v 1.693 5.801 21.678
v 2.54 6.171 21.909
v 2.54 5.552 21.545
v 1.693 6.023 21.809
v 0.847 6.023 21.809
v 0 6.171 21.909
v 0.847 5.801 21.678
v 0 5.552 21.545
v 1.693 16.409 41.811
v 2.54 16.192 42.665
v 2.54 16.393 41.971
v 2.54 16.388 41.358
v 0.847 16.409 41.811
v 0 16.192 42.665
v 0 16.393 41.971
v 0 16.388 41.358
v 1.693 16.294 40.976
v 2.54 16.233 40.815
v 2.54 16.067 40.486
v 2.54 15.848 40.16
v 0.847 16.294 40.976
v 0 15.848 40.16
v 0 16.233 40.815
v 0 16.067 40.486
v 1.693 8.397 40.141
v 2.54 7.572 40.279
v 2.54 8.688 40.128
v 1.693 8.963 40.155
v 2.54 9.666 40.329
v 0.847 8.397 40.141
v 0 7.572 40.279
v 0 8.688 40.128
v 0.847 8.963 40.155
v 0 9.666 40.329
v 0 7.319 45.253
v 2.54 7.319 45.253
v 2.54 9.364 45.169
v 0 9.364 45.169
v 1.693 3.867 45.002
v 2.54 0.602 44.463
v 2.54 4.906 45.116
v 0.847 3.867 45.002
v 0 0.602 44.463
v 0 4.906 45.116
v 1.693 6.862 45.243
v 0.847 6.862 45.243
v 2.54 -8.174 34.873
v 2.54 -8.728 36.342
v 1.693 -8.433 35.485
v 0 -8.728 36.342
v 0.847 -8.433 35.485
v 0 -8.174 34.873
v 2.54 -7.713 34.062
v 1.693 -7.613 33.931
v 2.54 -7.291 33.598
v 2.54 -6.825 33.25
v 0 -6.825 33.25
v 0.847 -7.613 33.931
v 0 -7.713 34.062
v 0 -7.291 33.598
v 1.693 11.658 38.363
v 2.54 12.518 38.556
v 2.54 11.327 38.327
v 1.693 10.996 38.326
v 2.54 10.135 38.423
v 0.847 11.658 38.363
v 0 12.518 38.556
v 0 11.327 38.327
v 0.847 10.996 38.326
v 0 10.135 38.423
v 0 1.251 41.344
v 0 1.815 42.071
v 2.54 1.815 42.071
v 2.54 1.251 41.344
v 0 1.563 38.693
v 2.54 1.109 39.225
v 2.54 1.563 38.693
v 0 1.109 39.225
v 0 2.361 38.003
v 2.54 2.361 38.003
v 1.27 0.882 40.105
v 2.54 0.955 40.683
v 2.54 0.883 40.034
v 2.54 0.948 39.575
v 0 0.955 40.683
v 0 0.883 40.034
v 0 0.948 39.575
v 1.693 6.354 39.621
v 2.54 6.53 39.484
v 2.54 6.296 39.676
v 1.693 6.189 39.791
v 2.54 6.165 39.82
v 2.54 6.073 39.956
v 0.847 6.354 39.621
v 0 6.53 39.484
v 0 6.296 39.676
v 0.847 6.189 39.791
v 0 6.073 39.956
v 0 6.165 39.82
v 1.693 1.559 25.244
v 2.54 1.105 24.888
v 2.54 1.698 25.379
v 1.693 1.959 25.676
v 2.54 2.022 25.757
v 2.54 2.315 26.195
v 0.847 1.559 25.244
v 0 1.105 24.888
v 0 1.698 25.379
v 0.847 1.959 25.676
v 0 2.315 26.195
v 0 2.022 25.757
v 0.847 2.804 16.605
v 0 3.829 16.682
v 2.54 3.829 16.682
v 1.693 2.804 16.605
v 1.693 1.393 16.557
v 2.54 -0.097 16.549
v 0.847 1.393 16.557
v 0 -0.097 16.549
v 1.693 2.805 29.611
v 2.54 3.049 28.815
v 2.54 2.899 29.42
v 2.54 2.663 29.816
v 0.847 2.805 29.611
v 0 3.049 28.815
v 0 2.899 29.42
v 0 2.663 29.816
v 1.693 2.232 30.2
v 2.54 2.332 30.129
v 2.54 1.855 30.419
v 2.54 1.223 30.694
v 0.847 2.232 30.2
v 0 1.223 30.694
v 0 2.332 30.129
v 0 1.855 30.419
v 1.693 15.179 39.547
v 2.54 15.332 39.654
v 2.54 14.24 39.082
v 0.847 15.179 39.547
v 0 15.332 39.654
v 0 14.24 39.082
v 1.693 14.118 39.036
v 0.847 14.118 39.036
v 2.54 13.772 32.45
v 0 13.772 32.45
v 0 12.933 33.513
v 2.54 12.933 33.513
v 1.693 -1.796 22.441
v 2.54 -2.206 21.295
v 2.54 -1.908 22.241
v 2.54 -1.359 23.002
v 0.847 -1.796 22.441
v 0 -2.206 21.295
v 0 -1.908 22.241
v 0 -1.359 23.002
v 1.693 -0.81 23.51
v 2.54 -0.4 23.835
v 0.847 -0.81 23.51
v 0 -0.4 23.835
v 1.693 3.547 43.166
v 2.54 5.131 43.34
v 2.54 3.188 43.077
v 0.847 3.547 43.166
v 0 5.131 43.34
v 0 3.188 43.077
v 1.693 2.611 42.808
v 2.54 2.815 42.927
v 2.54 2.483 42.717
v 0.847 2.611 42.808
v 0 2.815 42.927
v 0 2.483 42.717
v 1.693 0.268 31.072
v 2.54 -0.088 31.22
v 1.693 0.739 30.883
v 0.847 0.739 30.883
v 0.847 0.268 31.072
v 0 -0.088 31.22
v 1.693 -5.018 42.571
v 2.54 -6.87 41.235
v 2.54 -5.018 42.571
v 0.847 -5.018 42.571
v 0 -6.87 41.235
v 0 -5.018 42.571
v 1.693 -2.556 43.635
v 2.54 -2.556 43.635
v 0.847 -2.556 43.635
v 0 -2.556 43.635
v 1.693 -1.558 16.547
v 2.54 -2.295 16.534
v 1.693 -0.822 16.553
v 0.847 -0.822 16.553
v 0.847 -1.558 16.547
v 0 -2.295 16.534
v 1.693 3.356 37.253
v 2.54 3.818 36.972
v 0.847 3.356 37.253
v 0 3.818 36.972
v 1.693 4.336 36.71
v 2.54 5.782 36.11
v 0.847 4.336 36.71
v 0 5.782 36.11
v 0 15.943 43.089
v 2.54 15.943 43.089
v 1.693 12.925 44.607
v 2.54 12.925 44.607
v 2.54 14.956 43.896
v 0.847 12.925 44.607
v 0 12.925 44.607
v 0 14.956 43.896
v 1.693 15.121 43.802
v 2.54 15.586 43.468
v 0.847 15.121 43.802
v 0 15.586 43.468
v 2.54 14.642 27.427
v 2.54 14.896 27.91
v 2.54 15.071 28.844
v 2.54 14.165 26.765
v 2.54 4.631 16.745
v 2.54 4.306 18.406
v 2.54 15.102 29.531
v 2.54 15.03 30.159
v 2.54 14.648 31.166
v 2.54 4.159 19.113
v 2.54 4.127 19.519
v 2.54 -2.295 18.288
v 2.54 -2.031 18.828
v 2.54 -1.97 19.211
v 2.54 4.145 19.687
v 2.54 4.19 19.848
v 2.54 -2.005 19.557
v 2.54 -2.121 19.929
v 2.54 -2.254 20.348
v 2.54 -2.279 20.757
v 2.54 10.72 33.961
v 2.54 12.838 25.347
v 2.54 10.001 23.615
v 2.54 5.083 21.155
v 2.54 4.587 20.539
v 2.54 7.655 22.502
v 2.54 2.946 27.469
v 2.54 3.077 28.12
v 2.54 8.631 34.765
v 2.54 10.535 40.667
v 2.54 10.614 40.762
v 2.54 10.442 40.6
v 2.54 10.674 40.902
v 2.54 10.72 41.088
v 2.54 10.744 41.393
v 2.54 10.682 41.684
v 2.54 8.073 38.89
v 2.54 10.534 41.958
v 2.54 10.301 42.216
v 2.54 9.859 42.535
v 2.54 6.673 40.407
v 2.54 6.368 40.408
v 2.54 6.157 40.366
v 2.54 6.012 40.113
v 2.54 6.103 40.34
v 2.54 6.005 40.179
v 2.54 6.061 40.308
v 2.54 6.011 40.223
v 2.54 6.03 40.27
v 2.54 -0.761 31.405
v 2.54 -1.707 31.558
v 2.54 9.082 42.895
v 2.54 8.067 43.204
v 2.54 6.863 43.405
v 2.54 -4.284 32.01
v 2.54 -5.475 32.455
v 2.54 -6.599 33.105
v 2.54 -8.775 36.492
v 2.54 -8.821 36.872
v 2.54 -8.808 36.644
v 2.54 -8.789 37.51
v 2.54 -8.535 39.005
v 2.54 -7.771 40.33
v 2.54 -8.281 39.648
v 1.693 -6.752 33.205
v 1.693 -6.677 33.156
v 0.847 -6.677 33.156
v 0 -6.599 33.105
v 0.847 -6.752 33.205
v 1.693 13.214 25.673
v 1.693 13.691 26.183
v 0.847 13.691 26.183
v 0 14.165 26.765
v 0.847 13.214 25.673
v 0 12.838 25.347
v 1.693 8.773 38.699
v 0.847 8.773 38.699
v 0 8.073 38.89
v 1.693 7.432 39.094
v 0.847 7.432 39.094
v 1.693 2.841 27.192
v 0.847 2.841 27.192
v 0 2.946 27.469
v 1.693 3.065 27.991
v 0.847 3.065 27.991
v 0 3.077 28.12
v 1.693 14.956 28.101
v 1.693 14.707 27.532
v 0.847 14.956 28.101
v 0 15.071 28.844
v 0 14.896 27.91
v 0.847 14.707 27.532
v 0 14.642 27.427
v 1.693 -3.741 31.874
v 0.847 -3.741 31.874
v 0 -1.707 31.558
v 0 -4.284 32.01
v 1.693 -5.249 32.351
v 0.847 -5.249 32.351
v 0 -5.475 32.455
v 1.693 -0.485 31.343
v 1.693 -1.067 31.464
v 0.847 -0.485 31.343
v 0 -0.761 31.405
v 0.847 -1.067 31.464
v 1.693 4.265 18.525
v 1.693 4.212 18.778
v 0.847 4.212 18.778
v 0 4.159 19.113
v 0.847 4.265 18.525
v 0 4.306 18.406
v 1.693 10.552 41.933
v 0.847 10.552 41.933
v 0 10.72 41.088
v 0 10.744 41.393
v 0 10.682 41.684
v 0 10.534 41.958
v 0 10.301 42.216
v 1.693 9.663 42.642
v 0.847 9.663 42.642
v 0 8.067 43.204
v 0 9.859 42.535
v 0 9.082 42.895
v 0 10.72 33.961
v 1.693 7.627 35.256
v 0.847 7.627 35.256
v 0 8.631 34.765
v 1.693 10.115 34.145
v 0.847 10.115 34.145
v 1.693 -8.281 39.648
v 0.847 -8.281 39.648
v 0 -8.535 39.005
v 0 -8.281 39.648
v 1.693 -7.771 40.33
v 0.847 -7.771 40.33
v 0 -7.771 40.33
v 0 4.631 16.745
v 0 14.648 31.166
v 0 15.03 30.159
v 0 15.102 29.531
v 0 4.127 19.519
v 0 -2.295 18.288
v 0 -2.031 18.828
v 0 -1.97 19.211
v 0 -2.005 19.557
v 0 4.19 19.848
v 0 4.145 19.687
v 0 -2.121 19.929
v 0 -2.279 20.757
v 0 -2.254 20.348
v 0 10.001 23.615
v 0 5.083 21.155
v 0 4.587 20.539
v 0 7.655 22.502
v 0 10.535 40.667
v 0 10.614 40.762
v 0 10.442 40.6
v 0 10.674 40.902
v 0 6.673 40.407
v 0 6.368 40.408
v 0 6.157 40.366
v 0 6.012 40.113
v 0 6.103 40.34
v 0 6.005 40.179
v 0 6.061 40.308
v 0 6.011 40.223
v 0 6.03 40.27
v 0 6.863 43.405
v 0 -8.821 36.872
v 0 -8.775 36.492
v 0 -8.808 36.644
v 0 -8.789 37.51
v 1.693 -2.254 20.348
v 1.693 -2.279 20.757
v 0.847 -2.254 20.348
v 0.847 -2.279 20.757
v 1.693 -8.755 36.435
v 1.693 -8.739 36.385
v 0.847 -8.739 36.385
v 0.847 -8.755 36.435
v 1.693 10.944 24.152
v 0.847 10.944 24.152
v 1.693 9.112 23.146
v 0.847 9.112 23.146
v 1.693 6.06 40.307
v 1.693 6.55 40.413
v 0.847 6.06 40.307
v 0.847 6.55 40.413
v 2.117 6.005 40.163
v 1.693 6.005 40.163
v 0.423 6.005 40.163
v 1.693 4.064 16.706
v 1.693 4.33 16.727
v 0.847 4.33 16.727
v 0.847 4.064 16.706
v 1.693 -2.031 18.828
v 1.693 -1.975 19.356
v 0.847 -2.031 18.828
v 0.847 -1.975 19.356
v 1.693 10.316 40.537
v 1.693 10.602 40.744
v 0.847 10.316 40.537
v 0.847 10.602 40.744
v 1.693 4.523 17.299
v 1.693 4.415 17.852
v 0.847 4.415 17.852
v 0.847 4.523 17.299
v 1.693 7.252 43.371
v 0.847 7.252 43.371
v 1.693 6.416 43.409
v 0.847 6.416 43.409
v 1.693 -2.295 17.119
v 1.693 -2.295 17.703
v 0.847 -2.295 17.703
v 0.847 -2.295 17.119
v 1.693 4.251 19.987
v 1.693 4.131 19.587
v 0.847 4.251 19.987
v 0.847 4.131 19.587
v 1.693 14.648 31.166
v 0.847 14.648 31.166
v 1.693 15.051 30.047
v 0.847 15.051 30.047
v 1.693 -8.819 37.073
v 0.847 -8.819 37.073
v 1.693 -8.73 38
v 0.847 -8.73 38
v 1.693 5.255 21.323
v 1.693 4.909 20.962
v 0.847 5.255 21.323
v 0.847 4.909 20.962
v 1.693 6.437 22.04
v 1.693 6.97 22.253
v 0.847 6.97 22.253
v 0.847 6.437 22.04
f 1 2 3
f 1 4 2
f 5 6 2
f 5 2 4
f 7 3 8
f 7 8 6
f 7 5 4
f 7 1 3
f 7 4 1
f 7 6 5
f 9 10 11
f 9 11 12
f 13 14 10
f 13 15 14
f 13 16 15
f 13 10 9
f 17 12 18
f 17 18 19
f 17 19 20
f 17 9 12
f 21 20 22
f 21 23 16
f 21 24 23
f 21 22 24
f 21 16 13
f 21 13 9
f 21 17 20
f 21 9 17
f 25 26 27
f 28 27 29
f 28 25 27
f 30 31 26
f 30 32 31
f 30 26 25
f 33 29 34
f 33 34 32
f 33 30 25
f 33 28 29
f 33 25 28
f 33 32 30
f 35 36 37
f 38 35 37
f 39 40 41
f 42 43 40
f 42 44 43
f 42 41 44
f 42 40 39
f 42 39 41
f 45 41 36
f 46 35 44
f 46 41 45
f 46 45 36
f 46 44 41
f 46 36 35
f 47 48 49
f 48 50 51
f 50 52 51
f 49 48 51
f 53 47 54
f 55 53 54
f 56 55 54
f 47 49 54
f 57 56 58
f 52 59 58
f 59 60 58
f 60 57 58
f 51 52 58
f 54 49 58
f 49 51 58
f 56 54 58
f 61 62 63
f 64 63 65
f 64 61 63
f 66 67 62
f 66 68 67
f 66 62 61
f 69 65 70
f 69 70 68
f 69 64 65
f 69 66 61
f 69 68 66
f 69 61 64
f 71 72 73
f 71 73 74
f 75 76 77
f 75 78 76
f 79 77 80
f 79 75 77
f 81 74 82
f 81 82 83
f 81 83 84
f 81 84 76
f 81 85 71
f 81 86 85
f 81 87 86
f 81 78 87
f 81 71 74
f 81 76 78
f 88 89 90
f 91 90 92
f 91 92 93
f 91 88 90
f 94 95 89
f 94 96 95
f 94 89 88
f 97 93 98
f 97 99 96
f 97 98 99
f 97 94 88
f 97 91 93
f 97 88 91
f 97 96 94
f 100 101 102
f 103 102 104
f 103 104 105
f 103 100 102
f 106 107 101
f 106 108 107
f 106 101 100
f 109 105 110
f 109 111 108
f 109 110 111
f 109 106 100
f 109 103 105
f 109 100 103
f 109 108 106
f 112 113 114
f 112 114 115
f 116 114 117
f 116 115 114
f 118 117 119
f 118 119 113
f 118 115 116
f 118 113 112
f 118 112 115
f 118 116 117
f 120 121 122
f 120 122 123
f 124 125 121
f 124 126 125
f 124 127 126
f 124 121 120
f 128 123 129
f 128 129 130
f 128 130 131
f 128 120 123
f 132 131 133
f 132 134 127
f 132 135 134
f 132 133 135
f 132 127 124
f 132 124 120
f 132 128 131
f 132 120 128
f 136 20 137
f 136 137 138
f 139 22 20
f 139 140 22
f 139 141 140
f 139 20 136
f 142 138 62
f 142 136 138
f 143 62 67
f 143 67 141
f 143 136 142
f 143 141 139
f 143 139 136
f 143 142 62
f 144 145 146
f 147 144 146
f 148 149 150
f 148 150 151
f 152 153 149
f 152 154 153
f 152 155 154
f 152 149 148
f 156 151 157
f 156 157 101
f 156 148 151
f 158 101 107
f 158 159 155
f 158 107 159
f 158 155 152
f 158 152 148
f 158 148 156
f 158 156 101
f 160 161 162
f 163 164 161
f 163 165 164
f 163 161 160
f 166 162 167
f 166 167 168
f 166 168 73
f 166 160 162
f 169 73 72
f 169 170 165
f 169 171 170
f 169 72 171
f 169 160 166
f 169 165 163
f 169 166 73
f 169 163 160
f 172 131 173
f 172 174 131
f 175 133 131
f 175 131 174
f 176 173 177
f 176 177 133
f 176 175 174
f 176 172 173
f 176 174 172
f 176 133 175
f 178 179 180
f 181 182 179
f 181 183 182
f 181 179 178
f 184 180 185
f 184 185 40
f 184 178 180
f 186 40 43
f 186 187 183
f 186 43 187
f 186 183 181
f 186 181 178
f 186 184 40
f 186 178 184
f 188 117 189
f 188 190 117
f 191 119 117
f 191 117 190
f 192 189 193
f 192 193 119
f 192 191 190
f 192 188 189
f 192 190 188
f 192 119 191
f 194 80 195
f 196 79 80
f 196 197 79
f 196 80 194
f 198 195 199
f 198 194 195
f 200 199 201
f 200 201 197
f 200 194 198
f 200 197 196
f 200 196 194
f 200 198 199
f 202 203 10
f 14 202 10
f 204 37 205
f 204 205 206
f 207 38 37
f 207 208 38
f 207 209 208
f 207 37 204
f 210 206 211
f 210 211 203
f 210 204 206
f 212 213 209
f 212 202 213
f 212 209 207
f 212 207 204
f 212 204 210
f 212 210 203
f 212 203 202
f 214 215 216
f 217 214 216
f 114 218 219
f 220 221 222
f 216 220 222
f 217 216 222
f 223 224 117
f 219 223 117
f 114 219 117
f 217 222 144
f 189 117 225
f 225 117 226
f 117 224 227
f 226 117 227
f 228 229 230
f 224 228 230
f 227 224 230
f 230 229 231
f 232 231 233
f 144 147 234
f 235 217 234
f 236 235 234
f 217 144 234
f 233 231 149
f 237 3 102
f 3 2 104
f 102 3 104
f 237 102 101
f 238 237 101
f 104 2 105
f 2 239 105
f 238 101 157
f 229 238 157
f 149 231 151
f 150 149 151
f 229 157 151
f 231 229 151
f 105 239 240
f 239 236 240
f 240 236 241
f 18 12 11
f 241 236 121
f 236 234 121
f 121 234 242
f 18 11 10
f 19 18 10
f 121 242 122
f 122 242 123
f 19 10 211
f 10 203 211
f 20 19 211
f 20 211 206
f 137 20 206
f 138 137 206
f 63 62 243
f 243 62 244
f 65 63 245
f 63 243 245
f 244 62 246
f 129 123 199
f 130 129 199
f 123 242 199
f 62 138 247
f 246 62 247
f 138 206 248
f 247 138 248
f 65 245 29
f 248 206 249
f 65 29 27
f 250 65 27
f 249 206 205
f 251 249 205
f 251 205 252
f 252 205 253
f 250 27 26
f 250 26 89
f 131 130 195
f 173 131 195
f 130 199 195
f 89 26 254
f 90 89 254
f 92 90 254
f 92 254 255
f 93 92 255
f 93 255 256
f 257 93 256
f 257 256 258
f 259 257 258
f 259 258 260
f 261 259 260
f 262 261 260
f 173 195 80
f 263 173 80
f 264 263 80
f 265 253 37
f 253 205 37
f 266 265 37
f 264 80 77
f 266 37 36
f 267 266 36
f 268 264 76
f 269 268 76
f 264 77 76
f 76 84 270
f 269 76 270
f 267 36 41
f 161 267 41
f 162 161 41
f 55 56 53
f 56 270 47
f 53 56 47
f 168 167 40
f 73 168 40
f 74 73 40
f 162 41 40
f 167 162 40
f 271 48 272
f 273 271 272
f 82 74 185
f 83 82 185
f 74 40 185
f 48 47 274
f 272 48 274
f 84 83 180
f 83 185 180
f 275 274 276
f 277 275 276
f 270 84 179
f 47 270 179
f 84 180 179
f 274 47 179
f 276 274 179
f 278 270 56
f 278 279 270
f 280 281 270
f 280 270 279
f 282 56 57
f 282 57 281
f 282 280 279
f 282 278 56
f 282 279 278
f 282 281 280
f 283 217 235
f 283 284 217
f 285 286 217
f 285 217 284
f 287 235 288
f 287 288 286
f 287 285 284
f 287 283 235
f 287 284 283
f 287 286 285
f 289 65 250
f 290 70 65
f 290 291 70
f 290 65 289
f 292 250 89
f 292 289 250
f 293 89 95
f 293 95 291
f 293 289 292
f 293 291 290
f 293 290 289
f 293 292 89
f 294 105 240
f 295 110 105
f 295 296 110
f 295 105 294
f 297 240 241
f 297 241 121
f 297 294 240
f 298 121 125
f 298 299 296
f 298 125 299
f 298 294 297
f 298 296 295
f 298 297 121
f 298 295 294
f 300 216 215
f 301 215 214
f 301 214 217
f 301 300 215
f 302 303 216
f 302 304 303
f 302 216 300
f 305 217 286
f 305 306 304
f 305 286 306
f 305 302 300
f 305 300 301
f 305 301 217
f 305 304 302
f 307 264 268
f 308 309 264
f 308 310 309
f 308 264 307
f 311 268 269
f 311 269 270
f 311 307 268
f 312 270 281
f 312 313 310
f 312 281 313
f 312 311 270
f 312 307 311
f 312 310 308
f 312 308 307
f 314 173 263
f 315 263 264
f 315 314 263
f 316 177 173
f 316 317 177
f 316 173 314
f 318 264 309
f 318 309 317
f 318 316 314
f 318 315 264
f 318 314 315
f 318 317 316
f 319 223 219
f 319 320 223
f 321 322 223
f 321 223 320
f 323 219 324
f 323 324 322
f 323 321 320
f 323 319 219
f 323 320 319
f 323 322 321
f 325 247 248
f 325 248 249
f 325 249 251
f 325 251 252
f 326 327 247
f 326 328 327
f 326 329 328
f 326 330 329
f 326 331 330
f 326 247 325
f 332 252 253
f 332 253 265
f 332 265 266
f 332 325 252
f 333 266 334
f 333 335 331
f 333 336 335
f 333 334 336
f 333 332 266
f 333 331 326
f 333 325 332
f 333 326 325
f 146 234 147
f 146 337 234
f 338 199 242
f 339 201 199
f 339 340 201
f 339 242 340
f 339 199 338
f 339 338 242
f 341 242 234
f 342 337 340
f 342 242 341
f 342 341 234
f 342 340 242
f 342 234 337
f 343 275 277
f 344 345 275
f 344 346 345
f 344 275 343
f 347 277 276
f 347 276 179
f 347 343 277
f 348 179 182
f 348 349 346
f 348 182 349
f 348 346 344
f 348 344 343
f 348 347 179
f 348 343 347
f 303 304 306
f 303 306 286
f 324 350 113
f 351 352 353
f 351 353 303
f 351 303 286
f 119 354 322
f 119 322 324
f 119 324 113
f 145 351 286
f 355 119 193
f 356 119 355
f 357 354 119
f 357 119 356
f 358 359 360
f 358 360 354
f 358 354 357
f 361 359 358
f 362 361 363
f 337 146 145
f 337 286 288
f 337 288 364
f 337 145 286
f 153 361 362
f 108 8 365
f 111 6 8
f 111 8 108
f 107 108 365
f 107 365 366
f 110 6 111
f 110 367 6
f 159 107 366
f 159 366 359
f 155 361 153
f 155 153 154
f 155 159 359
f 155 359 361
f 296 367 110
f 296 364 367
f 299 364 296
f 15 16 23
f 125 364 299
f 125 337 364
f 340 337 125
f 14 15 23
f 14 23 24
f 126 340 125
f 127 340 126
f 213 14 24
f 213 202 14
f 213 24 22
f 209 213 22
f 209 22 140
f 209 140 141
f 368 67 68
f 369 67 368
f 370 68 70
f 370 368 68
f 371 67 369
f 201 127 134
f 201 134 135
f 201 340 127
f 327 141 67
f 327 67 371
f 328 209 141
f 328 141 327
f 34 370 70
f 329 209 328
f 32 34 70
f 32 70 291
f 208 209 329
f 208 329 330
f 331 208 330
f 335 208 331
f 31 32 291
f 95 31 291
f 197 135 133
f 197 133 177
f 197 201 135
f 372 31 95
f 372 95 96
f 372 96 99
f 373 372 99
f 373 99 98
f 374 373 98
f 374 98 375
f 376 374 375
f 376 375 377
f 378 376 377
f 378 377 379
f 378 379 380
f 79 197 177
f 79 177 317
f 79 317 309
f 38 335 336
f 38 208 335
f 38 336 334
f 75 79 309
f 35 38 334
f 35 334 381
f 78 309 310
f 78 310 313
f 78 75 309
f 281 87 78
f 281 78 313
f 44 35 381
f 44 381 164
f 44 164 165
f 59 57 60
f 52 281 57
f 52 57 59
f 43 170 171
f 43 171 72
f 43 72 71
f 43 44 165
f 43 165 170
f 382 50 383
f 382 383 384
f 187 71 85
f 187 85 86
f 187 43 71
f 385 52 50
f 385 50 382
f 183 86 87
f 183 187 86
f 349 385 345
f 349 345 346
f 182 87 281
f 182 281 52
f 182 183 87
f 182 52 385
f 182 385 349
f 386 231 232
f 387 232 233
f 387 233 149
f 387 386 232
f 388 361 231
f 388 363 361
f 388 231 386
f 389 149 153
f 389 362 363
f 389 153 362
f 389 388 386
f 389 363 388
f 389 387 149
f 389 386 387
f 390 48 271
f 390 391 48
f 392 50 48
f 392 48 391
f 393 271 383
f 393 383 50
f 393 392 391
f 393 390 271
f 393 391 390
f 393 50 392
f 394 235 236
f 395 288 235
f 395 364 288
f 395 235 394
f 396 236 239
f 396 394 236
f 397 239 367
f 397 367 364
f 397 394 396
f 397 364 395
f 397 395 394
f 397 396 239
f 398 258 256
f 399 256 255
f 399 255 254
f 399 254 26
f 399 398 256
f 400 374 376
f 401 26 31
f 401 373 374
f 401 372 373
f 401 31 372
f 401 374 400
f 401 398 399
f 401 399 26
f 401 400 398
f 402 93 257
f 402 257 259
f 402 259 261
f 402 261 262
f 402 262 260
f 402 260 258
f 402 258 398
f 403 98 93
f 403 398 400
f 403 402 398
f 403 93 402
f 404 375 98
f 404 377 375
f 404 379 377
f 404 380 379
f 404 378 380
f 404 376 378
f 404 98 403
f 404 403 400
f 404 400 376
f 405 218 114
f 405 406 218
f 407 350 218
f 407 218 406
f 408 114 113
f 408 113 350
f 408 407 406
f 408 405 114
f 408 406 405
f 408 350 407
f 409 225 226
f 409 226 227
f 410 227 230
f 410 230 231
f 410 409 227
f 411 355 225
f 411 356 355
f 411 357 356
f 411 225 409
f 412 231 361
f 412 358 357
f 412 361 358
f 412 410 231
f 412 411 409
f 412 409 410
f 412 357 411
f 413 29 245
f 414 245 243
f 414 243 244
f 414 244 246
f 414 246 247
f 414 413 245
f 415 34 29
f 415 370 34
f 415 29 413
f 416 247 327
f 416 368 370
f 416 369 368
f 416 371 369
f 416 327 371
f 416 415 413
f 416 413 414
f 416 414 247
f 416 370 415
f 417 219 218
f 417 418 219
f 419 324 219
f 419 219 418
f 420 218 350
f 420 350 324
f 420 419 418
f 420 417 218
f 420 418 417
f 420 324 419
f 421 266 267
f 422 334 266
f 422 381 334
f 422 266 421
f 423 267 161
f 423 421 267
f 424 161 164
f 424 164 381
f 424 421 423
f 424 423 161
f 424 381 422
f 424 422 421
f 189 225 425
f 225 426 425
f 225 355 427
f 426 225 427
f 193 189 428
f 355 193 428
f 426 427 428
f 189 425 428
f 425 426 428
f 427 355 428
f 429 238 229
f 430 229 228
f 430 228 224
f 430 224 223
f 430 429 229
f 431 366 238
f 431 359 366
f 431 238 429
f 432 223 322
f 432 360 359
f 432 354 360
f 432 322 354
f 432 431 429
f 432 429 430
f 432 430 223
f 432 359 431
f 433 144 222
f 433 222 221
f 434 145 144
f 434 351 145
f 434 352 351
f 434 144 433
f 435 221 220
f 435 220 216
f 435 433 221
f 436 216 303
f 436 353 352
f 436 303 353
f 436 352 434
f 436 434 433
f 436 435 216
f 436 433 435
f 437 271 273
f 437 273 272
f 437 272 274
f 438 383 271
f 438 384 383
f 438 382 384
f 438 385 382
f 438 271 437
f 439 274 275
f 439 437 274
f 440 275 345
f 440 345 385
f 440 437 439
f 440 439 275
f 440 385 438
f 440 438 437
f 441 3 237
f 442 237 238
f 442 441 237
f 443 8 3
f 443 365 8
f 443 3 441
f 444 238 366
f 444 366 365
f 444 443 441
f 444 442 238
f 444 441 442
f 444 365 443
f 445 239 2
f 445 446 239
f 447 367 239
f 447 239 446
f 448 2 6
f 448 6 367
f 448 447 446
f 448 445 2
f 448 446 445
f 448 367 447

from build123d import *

# Parameters (mm, degrees)
F1_DEPTH = 2.54


with BuildPart() as f1:
    # F0 (on Right) → F1 (new body)
    with BuildSketch(Plane.YZ):
        with BuildLine():
            add(Edge.make_bspline(
                [(4.3062982129, 18.4064569529), (4.4145754331, 17.851669978), (4.5227315225, 17.2993939442), (4.6310087426, 16.7446069692)],
                knots=[0, 0, 0, 0, 1.6932756114, 1.6932756114, 1.6932756114, 1.6932756114], degree=3))
            add(Edge.make_bspline(
                [(4.1593257549, 19.1126760485), (4.2081809899, 18.7562347142), (4.274320241, 18.4384364203), (4.3062982129, 18.4064569529)],
                knots=[0, 0, 0, 0, 1, 1, 1, 1], degree=3))
            add(Edge.make_bspline(
                [(4.587080479, 20.5390156251), (4.1199305204, 19.8352235894), (4.0789979985, 19.6987369871), (4.1593257549, 19.1126760485)],
                knots=[0, 0, 0, 0, 1, 1, 1, 1], degree=3))
            add(Edge.make_bspline(
                [(5.5515264837, 21.5446767853), (5.3052015891, 21.4196091783), (4.8712005131, 20.9670619552), (4.587080479, 20.5390156251)],
                knots=[0, 0, 0, 0, 1, 1, 1, 1], degree=3))
            add(Edge.make_bspline(
                [(6.1705583504, 21.9085323912), (6.0764144472, 21.8334789664), (5.7978513782, 21.6697458878), (5.5515264837, 21.5446767853)],
                knots=[0, 0, 0, 0, 1, 1, 1, 1], degree=3))
            add(Edge.make_bspline(
                [(7.6551638138, 22.5023530426), (6.9327747869, 22.2508031651), (6.2647022536, 21.9835843206), (6.1705583504, 21.9085323912)],
                knots=[0, 0, 0, 0, 1, 1, 1, 1], degree=3))
            add(Edge.make_bspline(
                [(12.8379490604, 25.3474205293), (11.0188744075, 24.1153788353), (8.8182758107, 22.907369969), (7.6551638138, 22.5023530426)],
                knots=[0, 0, 0, 0, 1, 1, 1, 1], degree=3))
            add(Edge.make_bspline(
                [(14.1645862732, 26.7650134187), (13.7263112988, 26.182685038), (13.1293263476, 25.5447690602), (12.8379490604, 25.3474205293)],
                knots=[0, 0, 0, 0, 1, 1, 1, 1], degree=3))
            add(Edge.make_bspline(
                [(15.0707260149, 28.8437191762), (14.9687566007, 27.8920215914), (14.9081429111, 27.7529688556), (14.1645862732, 26.7650134187)],
                knots=[0, 0, 0, 0, 1, 1, 1, 1], degree=3))
            add(Edge.make_bspline(
                [(13.7717031507, 32.4500579966), (14.9154480174, 30.9995061424), (15.2131509134, 30.1730242108), (15.0707260149, 28.8437191762)],
                knots=[0, 0, 0, 0, 1, 1, 1, 1], degree=3))
            Line((13.7717031507, 32.4500579966), (12.9332459293, 33.5134287489))
            add(Edge.make_bspline(
                [(5.7822467141, 36.1096769875), (6.3762820613, 35.8425612862), (7.6581101579, 35.2661706512), (10.0985801685, 33.9916505274), (11.9792064067, 33.6743798154), (12.9332459293, 33.5134287489)],
                knots=[0, 0, 0, 0, 0.2985104209, 0.6441351452, 1, 1, 1, 1], degree=3))
            add(Edge.make_bspline(
                [(2.3612512264, 38.0030753022), (3.524023764, 37.060348717), (3.9435058477, 36.828180924), (5.7822467141, 36.1096769875)],
                knots=[0, 0, 0, 0, 1, 1, 1, 1], degree=3))
            add(Edge.make_bspline(
                [(0.8822565632, 40.104596619), (0.8822565632, 39.355544328), (1.1336105412, 38.9983941666), (2.3612512264, 38.0030753022)],
                knots=[0, 0, 0, 0, 1, 1, 1, 1], degree=3))
            add(Edge.make_bspline(
                [(1.8150057341, 42.0706138216), (1.1379322929, 41.3211757133), (0.8822565632, 40.7822712173), (0.8822565632, 40.104596619)],
                knots=[0, 0, 0, 0, 1, 1, 1, 1], degree=3))
            add(Edge.make_bspline(
                [(5.130764324, 43.3401306362), (3.05388746, 43.1938311152), (2.7112413368, 43.0626412758), (1.8150057341, 42.0706138216)],
                knots=[0, 0, 0, 0, 1, 1, 1, 1], degree=3))
            add(Edge.make_bspline(
                [(8.0668398269, 43.2044874484), (7.1214319611, 43.4407407174), (6.7817796603, 43.4564321157), (5.130764324, 43.3401306362)],
                knots=[0, 0, 0, 0, 1, 1, 1, 1], degree=3))
            add(Edge.make_bspline(
                [(10.7201501424, 41.0876351286), (10.9152779809, 41.9986469351), (10.0136334591, 42.7179927908), (8.0668398269, 43.2044874484)],
                knots=[0, 0, 0, 0, 1, 1, 1, 1], degree=3))
            add(Edge.make_bspline(
                [(9.665690573, 40.3289329193), (10.5618693499, 40.5852172833), (10.6217697262, 40.6283181582), (10.7201501424, 41.0876351286)],
                knots=[0, 0, 0, 0, 1, 1, 1, 1], degree=3))
            add(Edge.make_bspline(
                [(7.5720919693, 40.2786809659), (8.6570311041, 40.0685451343), (8.7641507304, 40.0711157541), (9.665690573, 40.3289329193)],
                knots=[0, 0, 0, 0, 1, 1, 1, 1], degree=3))
            add(Edge.make_bspline(
                [(6.0726310451, 39.9564846541), (5.8181157581, 40.4320493175), (6.2742280524, 40.5300558798), (7.5720919693, 40.2786809659)],
                knots=[0, 0, 0, 0, 1, 1, 1, 1], degree=3))
            add(Edge.make_bspline(
                [(6.5300473421, 39.4837029595), (6.3592693595, 39.5927561585), (6.153431353, 39.8055074725), (6.0726310451, 39.9564846541)],
                knots=[0, 0, 0, 0, 1, 1, 1, 1], degree=3))
            add(Edge.make_bspline(
                [(10.1351419765, 38.422938717), (8.9017319771, 38.5991465544), (7.0723090467, 39.1374364346), (6.5300473421, 39.4837029595)],
                knots=[0, 0, 0, 0, 1, 1, 1, 1], degree=3))
            add(Edge.make_bspline(
                [(12.5184609466, 38.5560277345), (11.4262137148, 38.2780015199), (11.2273892084, 38.2668980574), (10.1351419765, 38.422938717)],
                knots=[0, 0, 0, 0, 1, 1, 1, 1], degree=3))
            add(Edge.make_bspline(
                [(15.8478038939, 40.1600989773), (15.3262417352, 39.4728148369), (14.4370196327, 39.0443901666), (12.5184609466, 38.5560277345)],
                knots=[0, 0, 0, 0, 1, 1, 1, 1], degree=3))
            add(Edge.make_bspline(
                [(16.1916538269, 42.665268915), (16.5742081122, 41.8004400355), (16.459741508, 40.9664720523), (15.8478038939, 40.1600989773)],
                knots=[0, 0, 0, 0, 1, 1, 1, 1], degree=3))
            add(Edge.make_bspline(
                [(9.3640681921, 45.169465337), (13.687454414, 44.6991854732), (15.6026887907, 43.9967228622), (16.1916538269, 42.665268915)],
                knots=[0, 0, 0, 0, 1, 1, 1, 1], degree=3))
            add(Edge.make_bspline(
                [(0.6018660961, 44.4634840126), (3.9265493277, 45.1443049658), (7.1831702034, 45.4066951126), (9.3640681921, 45.169465337)],
                knots=[0, 0, 0, 0, 1, 1, 1, 1], degree=3))
            add(Edge.make_bspline(
                [(-6.869657556, 41.234824422), (-5.2947947751, 42.7188122786), (-2.9319959009, 43.7398283685), (0.6018660961, 44.4634840126)],
                knots=[0, 0, 0, 0, 1, 1, 1, 1], degree=3))
            add(Edge.make_bspline(
                [(-8.5345189474, 39.0052730794), (-8.3623113473, 39.6899925817), (-8.0137224416, 40.156818035), (-6.869657556, 41.234824422)],
                knots=[0, 0, 0, 0, 1, 1, 1, 1], degree=3))
            add(Edge.make_bspline(
                [(-8.7753407118, 36.4924825027), (-8.8935279106, 36.8100804109), (-8.7745930039, 38.0504859655), (-8.5345189474, 39.0052730794)],
                knots=[0, 0, 0, 0, 1, 1, 1, 1], degree=3))
            add(Edge.make_bspline(
                [(-8.7281162361, 36.3415613512), (-8.7359523782, 36.3815132341), (-8.7524901075, 36.4310764124), (-8.7753407118, 36.4924825027)],
                knots=[0.7856250085, 0.7856250085, 0.7856250085, 0.7856250085, 1, 1, 1, 1], degree=3))
            add(Edge.make_bspline(
                [(-8.7281162361, 36.3415613512), (-8.6458521412, 36.079976454), (-8.4223909985, 35.3950724639), (-7.7740737011, 33.9365337451), (-7.1033373756, 33.4345247336), (-6.8248215993, 33.2504152378)],
                knots=[0.0477039482, 0.0477039482, 0.0477039482, 0.0477039482, 0.2946798893, 0.6733320976, 0.9307398592, 0.9307398592, 0.9307398592, 0.9307398592], degree=3))
            add(Edge.make_bspline(
                [(-6.5989783193, 33.1045596313), (-6.6784388414, 33.1576214869), (-6.7534797046, 33.2061446456), (-6.8248215993, 33.2504152378)],
                knots=[0, 0, 0, 0, 0.1293994473, 0.1293994473, 0.1293994473, 0.1293994473], degree=3))
            add(Edge.make_bspline(
                [(-1.7070350009, 31.5580125491), (-4.1254349308, 31.8328086656), (-5.2061584884, 32.1744708052), (-6.5989783193, 33.1045596313)],
                knots=[0, 0, 0, 0, 1, 1, 1, 1], degree=3))
            add(Edge.make_bspline(
                [(-0.0876372414, 31.2203327018), (-0.3512072712, 31.3347993061), (-1.0799368612, 31.4867544896), (-1.7070350009, 31.5580125491)],
                knots=[0, 0, 0, 0, 1, 1, 1, 1], degree=3))
            add(Edge.make_bspline(
                [(1.2231171599, 30.6940734419), (0.7657711475, 30.8690505521), (0.1759312931, 31.1058660975), (-0.0876372414, 31.2203327018)],
                knots=[0, 0, 0, 0, 1, 1, 1, 1], degree=3))
            add(Edge.make_bspline(
                [(3.0494864513, 28.81478288), (2.9324193189, 29.7517625823), (2.4863203289, 30.2107879467), (1.2231171599, 30.6940734419)],
                knots=[0, 0, 0, 0, 1, 1, 1, 1], degree=3))
            add(Edge.make_bspline(
                [(2.3150428774, 26.1949070715), (3.0131418651, 27.3668106181), (3.1634206875, 27.9028798057), (3.0494864513, 28.81478288)],
                knots=[0, 0, 0, 0, 1, 1, 1, 1], degree=3))
            add(Edge.make_bspline(
                [(1.1052768976, 24.8880422468), (1.5894491744, 25.2096807685), (1.9785115095, 25.6299688814), (2.3150428774, 26.1949070715)],
                knots=[0, 0, 0, 0, 1, 1, 1, 1], degree=3))
            add(Edge.make_bspline(
                [(-2.2063049959, 21.2954821878), (-1.9664672152, 22.606247057), (-1.3928810353, 23.228498554), (1.1052768976, 24.8880422468)],
                knots=[0, 0, 0, 0, 1, 1, 1, 1], degree=3))
            add(Edge.make_bspline(
                [(-2.1212277989, 19.9286152985), (-2.3103276161, 20.4012205339), (-2.3254582334, 20.6443003762), (-2.2063049959, 21.2954821878)],
                knots=[0, 0, 0, 0, 1, 1, 1, 1], degree=3))
            add(Edge.make_bspline(
                [(-2.29458986, 18.2876431748), (-1.924623985, 18.8522822818), (-1.8757343555, 19.3150626353), (-2.1212277989, 19.9286152985)],
                knots=[0, 0, 0, 0, 1, 1, 1, 1], degree=3))
            add(Edge.make_bspline(
                [(-2.29458986, 18.2876431748), (-2.29458986, 17.7030911022), (-2.29458986, 17.1185390296), (-2.29458986, 16.533986957)],
                knots=[0, 0, 0, 0, 1.7536562178, 1.7536562178, 1.7536562178, 1.7536562178], degree=3))
            add(Edge.make_bspline(
                [(-0.0965289838, 16.5494406097), (-0.8129556754, 16.5571901602), (-1.5605586109, 16.551185881), (-2.29458986, 16.533986957)],
                knots=[0, 0, 0, 0, 0.2456952601, 0.2456952601, 0.2456952601, 0.2456952601], degree=3))
            add(Edge.make_bspline(
                [(3.8289375551, 16.681698176), (3.0978347403, 16.5935120095), (1.3313747977, 16.5339959551), (-0.0965289838, 16.5494406097)],
                knots=[0, 0, 0, 0, 1, 1, 1, 1], degree=3))
            add(Edge.make_bspline(
                [(4.6310087426, 16.7446069692), (4.3124459161, 16.729239125), (4.0494007129, 16.7082907732), (3.8289375551, 16.681698176)],
                knots=[0.7704771185, 0.7704771185, 0.7704771185, 0.7704771185, 1, 1, 1, 1], degree=3))
        make_face()
    extrude(amount=F1_DEPTH)


solid = f1.part
